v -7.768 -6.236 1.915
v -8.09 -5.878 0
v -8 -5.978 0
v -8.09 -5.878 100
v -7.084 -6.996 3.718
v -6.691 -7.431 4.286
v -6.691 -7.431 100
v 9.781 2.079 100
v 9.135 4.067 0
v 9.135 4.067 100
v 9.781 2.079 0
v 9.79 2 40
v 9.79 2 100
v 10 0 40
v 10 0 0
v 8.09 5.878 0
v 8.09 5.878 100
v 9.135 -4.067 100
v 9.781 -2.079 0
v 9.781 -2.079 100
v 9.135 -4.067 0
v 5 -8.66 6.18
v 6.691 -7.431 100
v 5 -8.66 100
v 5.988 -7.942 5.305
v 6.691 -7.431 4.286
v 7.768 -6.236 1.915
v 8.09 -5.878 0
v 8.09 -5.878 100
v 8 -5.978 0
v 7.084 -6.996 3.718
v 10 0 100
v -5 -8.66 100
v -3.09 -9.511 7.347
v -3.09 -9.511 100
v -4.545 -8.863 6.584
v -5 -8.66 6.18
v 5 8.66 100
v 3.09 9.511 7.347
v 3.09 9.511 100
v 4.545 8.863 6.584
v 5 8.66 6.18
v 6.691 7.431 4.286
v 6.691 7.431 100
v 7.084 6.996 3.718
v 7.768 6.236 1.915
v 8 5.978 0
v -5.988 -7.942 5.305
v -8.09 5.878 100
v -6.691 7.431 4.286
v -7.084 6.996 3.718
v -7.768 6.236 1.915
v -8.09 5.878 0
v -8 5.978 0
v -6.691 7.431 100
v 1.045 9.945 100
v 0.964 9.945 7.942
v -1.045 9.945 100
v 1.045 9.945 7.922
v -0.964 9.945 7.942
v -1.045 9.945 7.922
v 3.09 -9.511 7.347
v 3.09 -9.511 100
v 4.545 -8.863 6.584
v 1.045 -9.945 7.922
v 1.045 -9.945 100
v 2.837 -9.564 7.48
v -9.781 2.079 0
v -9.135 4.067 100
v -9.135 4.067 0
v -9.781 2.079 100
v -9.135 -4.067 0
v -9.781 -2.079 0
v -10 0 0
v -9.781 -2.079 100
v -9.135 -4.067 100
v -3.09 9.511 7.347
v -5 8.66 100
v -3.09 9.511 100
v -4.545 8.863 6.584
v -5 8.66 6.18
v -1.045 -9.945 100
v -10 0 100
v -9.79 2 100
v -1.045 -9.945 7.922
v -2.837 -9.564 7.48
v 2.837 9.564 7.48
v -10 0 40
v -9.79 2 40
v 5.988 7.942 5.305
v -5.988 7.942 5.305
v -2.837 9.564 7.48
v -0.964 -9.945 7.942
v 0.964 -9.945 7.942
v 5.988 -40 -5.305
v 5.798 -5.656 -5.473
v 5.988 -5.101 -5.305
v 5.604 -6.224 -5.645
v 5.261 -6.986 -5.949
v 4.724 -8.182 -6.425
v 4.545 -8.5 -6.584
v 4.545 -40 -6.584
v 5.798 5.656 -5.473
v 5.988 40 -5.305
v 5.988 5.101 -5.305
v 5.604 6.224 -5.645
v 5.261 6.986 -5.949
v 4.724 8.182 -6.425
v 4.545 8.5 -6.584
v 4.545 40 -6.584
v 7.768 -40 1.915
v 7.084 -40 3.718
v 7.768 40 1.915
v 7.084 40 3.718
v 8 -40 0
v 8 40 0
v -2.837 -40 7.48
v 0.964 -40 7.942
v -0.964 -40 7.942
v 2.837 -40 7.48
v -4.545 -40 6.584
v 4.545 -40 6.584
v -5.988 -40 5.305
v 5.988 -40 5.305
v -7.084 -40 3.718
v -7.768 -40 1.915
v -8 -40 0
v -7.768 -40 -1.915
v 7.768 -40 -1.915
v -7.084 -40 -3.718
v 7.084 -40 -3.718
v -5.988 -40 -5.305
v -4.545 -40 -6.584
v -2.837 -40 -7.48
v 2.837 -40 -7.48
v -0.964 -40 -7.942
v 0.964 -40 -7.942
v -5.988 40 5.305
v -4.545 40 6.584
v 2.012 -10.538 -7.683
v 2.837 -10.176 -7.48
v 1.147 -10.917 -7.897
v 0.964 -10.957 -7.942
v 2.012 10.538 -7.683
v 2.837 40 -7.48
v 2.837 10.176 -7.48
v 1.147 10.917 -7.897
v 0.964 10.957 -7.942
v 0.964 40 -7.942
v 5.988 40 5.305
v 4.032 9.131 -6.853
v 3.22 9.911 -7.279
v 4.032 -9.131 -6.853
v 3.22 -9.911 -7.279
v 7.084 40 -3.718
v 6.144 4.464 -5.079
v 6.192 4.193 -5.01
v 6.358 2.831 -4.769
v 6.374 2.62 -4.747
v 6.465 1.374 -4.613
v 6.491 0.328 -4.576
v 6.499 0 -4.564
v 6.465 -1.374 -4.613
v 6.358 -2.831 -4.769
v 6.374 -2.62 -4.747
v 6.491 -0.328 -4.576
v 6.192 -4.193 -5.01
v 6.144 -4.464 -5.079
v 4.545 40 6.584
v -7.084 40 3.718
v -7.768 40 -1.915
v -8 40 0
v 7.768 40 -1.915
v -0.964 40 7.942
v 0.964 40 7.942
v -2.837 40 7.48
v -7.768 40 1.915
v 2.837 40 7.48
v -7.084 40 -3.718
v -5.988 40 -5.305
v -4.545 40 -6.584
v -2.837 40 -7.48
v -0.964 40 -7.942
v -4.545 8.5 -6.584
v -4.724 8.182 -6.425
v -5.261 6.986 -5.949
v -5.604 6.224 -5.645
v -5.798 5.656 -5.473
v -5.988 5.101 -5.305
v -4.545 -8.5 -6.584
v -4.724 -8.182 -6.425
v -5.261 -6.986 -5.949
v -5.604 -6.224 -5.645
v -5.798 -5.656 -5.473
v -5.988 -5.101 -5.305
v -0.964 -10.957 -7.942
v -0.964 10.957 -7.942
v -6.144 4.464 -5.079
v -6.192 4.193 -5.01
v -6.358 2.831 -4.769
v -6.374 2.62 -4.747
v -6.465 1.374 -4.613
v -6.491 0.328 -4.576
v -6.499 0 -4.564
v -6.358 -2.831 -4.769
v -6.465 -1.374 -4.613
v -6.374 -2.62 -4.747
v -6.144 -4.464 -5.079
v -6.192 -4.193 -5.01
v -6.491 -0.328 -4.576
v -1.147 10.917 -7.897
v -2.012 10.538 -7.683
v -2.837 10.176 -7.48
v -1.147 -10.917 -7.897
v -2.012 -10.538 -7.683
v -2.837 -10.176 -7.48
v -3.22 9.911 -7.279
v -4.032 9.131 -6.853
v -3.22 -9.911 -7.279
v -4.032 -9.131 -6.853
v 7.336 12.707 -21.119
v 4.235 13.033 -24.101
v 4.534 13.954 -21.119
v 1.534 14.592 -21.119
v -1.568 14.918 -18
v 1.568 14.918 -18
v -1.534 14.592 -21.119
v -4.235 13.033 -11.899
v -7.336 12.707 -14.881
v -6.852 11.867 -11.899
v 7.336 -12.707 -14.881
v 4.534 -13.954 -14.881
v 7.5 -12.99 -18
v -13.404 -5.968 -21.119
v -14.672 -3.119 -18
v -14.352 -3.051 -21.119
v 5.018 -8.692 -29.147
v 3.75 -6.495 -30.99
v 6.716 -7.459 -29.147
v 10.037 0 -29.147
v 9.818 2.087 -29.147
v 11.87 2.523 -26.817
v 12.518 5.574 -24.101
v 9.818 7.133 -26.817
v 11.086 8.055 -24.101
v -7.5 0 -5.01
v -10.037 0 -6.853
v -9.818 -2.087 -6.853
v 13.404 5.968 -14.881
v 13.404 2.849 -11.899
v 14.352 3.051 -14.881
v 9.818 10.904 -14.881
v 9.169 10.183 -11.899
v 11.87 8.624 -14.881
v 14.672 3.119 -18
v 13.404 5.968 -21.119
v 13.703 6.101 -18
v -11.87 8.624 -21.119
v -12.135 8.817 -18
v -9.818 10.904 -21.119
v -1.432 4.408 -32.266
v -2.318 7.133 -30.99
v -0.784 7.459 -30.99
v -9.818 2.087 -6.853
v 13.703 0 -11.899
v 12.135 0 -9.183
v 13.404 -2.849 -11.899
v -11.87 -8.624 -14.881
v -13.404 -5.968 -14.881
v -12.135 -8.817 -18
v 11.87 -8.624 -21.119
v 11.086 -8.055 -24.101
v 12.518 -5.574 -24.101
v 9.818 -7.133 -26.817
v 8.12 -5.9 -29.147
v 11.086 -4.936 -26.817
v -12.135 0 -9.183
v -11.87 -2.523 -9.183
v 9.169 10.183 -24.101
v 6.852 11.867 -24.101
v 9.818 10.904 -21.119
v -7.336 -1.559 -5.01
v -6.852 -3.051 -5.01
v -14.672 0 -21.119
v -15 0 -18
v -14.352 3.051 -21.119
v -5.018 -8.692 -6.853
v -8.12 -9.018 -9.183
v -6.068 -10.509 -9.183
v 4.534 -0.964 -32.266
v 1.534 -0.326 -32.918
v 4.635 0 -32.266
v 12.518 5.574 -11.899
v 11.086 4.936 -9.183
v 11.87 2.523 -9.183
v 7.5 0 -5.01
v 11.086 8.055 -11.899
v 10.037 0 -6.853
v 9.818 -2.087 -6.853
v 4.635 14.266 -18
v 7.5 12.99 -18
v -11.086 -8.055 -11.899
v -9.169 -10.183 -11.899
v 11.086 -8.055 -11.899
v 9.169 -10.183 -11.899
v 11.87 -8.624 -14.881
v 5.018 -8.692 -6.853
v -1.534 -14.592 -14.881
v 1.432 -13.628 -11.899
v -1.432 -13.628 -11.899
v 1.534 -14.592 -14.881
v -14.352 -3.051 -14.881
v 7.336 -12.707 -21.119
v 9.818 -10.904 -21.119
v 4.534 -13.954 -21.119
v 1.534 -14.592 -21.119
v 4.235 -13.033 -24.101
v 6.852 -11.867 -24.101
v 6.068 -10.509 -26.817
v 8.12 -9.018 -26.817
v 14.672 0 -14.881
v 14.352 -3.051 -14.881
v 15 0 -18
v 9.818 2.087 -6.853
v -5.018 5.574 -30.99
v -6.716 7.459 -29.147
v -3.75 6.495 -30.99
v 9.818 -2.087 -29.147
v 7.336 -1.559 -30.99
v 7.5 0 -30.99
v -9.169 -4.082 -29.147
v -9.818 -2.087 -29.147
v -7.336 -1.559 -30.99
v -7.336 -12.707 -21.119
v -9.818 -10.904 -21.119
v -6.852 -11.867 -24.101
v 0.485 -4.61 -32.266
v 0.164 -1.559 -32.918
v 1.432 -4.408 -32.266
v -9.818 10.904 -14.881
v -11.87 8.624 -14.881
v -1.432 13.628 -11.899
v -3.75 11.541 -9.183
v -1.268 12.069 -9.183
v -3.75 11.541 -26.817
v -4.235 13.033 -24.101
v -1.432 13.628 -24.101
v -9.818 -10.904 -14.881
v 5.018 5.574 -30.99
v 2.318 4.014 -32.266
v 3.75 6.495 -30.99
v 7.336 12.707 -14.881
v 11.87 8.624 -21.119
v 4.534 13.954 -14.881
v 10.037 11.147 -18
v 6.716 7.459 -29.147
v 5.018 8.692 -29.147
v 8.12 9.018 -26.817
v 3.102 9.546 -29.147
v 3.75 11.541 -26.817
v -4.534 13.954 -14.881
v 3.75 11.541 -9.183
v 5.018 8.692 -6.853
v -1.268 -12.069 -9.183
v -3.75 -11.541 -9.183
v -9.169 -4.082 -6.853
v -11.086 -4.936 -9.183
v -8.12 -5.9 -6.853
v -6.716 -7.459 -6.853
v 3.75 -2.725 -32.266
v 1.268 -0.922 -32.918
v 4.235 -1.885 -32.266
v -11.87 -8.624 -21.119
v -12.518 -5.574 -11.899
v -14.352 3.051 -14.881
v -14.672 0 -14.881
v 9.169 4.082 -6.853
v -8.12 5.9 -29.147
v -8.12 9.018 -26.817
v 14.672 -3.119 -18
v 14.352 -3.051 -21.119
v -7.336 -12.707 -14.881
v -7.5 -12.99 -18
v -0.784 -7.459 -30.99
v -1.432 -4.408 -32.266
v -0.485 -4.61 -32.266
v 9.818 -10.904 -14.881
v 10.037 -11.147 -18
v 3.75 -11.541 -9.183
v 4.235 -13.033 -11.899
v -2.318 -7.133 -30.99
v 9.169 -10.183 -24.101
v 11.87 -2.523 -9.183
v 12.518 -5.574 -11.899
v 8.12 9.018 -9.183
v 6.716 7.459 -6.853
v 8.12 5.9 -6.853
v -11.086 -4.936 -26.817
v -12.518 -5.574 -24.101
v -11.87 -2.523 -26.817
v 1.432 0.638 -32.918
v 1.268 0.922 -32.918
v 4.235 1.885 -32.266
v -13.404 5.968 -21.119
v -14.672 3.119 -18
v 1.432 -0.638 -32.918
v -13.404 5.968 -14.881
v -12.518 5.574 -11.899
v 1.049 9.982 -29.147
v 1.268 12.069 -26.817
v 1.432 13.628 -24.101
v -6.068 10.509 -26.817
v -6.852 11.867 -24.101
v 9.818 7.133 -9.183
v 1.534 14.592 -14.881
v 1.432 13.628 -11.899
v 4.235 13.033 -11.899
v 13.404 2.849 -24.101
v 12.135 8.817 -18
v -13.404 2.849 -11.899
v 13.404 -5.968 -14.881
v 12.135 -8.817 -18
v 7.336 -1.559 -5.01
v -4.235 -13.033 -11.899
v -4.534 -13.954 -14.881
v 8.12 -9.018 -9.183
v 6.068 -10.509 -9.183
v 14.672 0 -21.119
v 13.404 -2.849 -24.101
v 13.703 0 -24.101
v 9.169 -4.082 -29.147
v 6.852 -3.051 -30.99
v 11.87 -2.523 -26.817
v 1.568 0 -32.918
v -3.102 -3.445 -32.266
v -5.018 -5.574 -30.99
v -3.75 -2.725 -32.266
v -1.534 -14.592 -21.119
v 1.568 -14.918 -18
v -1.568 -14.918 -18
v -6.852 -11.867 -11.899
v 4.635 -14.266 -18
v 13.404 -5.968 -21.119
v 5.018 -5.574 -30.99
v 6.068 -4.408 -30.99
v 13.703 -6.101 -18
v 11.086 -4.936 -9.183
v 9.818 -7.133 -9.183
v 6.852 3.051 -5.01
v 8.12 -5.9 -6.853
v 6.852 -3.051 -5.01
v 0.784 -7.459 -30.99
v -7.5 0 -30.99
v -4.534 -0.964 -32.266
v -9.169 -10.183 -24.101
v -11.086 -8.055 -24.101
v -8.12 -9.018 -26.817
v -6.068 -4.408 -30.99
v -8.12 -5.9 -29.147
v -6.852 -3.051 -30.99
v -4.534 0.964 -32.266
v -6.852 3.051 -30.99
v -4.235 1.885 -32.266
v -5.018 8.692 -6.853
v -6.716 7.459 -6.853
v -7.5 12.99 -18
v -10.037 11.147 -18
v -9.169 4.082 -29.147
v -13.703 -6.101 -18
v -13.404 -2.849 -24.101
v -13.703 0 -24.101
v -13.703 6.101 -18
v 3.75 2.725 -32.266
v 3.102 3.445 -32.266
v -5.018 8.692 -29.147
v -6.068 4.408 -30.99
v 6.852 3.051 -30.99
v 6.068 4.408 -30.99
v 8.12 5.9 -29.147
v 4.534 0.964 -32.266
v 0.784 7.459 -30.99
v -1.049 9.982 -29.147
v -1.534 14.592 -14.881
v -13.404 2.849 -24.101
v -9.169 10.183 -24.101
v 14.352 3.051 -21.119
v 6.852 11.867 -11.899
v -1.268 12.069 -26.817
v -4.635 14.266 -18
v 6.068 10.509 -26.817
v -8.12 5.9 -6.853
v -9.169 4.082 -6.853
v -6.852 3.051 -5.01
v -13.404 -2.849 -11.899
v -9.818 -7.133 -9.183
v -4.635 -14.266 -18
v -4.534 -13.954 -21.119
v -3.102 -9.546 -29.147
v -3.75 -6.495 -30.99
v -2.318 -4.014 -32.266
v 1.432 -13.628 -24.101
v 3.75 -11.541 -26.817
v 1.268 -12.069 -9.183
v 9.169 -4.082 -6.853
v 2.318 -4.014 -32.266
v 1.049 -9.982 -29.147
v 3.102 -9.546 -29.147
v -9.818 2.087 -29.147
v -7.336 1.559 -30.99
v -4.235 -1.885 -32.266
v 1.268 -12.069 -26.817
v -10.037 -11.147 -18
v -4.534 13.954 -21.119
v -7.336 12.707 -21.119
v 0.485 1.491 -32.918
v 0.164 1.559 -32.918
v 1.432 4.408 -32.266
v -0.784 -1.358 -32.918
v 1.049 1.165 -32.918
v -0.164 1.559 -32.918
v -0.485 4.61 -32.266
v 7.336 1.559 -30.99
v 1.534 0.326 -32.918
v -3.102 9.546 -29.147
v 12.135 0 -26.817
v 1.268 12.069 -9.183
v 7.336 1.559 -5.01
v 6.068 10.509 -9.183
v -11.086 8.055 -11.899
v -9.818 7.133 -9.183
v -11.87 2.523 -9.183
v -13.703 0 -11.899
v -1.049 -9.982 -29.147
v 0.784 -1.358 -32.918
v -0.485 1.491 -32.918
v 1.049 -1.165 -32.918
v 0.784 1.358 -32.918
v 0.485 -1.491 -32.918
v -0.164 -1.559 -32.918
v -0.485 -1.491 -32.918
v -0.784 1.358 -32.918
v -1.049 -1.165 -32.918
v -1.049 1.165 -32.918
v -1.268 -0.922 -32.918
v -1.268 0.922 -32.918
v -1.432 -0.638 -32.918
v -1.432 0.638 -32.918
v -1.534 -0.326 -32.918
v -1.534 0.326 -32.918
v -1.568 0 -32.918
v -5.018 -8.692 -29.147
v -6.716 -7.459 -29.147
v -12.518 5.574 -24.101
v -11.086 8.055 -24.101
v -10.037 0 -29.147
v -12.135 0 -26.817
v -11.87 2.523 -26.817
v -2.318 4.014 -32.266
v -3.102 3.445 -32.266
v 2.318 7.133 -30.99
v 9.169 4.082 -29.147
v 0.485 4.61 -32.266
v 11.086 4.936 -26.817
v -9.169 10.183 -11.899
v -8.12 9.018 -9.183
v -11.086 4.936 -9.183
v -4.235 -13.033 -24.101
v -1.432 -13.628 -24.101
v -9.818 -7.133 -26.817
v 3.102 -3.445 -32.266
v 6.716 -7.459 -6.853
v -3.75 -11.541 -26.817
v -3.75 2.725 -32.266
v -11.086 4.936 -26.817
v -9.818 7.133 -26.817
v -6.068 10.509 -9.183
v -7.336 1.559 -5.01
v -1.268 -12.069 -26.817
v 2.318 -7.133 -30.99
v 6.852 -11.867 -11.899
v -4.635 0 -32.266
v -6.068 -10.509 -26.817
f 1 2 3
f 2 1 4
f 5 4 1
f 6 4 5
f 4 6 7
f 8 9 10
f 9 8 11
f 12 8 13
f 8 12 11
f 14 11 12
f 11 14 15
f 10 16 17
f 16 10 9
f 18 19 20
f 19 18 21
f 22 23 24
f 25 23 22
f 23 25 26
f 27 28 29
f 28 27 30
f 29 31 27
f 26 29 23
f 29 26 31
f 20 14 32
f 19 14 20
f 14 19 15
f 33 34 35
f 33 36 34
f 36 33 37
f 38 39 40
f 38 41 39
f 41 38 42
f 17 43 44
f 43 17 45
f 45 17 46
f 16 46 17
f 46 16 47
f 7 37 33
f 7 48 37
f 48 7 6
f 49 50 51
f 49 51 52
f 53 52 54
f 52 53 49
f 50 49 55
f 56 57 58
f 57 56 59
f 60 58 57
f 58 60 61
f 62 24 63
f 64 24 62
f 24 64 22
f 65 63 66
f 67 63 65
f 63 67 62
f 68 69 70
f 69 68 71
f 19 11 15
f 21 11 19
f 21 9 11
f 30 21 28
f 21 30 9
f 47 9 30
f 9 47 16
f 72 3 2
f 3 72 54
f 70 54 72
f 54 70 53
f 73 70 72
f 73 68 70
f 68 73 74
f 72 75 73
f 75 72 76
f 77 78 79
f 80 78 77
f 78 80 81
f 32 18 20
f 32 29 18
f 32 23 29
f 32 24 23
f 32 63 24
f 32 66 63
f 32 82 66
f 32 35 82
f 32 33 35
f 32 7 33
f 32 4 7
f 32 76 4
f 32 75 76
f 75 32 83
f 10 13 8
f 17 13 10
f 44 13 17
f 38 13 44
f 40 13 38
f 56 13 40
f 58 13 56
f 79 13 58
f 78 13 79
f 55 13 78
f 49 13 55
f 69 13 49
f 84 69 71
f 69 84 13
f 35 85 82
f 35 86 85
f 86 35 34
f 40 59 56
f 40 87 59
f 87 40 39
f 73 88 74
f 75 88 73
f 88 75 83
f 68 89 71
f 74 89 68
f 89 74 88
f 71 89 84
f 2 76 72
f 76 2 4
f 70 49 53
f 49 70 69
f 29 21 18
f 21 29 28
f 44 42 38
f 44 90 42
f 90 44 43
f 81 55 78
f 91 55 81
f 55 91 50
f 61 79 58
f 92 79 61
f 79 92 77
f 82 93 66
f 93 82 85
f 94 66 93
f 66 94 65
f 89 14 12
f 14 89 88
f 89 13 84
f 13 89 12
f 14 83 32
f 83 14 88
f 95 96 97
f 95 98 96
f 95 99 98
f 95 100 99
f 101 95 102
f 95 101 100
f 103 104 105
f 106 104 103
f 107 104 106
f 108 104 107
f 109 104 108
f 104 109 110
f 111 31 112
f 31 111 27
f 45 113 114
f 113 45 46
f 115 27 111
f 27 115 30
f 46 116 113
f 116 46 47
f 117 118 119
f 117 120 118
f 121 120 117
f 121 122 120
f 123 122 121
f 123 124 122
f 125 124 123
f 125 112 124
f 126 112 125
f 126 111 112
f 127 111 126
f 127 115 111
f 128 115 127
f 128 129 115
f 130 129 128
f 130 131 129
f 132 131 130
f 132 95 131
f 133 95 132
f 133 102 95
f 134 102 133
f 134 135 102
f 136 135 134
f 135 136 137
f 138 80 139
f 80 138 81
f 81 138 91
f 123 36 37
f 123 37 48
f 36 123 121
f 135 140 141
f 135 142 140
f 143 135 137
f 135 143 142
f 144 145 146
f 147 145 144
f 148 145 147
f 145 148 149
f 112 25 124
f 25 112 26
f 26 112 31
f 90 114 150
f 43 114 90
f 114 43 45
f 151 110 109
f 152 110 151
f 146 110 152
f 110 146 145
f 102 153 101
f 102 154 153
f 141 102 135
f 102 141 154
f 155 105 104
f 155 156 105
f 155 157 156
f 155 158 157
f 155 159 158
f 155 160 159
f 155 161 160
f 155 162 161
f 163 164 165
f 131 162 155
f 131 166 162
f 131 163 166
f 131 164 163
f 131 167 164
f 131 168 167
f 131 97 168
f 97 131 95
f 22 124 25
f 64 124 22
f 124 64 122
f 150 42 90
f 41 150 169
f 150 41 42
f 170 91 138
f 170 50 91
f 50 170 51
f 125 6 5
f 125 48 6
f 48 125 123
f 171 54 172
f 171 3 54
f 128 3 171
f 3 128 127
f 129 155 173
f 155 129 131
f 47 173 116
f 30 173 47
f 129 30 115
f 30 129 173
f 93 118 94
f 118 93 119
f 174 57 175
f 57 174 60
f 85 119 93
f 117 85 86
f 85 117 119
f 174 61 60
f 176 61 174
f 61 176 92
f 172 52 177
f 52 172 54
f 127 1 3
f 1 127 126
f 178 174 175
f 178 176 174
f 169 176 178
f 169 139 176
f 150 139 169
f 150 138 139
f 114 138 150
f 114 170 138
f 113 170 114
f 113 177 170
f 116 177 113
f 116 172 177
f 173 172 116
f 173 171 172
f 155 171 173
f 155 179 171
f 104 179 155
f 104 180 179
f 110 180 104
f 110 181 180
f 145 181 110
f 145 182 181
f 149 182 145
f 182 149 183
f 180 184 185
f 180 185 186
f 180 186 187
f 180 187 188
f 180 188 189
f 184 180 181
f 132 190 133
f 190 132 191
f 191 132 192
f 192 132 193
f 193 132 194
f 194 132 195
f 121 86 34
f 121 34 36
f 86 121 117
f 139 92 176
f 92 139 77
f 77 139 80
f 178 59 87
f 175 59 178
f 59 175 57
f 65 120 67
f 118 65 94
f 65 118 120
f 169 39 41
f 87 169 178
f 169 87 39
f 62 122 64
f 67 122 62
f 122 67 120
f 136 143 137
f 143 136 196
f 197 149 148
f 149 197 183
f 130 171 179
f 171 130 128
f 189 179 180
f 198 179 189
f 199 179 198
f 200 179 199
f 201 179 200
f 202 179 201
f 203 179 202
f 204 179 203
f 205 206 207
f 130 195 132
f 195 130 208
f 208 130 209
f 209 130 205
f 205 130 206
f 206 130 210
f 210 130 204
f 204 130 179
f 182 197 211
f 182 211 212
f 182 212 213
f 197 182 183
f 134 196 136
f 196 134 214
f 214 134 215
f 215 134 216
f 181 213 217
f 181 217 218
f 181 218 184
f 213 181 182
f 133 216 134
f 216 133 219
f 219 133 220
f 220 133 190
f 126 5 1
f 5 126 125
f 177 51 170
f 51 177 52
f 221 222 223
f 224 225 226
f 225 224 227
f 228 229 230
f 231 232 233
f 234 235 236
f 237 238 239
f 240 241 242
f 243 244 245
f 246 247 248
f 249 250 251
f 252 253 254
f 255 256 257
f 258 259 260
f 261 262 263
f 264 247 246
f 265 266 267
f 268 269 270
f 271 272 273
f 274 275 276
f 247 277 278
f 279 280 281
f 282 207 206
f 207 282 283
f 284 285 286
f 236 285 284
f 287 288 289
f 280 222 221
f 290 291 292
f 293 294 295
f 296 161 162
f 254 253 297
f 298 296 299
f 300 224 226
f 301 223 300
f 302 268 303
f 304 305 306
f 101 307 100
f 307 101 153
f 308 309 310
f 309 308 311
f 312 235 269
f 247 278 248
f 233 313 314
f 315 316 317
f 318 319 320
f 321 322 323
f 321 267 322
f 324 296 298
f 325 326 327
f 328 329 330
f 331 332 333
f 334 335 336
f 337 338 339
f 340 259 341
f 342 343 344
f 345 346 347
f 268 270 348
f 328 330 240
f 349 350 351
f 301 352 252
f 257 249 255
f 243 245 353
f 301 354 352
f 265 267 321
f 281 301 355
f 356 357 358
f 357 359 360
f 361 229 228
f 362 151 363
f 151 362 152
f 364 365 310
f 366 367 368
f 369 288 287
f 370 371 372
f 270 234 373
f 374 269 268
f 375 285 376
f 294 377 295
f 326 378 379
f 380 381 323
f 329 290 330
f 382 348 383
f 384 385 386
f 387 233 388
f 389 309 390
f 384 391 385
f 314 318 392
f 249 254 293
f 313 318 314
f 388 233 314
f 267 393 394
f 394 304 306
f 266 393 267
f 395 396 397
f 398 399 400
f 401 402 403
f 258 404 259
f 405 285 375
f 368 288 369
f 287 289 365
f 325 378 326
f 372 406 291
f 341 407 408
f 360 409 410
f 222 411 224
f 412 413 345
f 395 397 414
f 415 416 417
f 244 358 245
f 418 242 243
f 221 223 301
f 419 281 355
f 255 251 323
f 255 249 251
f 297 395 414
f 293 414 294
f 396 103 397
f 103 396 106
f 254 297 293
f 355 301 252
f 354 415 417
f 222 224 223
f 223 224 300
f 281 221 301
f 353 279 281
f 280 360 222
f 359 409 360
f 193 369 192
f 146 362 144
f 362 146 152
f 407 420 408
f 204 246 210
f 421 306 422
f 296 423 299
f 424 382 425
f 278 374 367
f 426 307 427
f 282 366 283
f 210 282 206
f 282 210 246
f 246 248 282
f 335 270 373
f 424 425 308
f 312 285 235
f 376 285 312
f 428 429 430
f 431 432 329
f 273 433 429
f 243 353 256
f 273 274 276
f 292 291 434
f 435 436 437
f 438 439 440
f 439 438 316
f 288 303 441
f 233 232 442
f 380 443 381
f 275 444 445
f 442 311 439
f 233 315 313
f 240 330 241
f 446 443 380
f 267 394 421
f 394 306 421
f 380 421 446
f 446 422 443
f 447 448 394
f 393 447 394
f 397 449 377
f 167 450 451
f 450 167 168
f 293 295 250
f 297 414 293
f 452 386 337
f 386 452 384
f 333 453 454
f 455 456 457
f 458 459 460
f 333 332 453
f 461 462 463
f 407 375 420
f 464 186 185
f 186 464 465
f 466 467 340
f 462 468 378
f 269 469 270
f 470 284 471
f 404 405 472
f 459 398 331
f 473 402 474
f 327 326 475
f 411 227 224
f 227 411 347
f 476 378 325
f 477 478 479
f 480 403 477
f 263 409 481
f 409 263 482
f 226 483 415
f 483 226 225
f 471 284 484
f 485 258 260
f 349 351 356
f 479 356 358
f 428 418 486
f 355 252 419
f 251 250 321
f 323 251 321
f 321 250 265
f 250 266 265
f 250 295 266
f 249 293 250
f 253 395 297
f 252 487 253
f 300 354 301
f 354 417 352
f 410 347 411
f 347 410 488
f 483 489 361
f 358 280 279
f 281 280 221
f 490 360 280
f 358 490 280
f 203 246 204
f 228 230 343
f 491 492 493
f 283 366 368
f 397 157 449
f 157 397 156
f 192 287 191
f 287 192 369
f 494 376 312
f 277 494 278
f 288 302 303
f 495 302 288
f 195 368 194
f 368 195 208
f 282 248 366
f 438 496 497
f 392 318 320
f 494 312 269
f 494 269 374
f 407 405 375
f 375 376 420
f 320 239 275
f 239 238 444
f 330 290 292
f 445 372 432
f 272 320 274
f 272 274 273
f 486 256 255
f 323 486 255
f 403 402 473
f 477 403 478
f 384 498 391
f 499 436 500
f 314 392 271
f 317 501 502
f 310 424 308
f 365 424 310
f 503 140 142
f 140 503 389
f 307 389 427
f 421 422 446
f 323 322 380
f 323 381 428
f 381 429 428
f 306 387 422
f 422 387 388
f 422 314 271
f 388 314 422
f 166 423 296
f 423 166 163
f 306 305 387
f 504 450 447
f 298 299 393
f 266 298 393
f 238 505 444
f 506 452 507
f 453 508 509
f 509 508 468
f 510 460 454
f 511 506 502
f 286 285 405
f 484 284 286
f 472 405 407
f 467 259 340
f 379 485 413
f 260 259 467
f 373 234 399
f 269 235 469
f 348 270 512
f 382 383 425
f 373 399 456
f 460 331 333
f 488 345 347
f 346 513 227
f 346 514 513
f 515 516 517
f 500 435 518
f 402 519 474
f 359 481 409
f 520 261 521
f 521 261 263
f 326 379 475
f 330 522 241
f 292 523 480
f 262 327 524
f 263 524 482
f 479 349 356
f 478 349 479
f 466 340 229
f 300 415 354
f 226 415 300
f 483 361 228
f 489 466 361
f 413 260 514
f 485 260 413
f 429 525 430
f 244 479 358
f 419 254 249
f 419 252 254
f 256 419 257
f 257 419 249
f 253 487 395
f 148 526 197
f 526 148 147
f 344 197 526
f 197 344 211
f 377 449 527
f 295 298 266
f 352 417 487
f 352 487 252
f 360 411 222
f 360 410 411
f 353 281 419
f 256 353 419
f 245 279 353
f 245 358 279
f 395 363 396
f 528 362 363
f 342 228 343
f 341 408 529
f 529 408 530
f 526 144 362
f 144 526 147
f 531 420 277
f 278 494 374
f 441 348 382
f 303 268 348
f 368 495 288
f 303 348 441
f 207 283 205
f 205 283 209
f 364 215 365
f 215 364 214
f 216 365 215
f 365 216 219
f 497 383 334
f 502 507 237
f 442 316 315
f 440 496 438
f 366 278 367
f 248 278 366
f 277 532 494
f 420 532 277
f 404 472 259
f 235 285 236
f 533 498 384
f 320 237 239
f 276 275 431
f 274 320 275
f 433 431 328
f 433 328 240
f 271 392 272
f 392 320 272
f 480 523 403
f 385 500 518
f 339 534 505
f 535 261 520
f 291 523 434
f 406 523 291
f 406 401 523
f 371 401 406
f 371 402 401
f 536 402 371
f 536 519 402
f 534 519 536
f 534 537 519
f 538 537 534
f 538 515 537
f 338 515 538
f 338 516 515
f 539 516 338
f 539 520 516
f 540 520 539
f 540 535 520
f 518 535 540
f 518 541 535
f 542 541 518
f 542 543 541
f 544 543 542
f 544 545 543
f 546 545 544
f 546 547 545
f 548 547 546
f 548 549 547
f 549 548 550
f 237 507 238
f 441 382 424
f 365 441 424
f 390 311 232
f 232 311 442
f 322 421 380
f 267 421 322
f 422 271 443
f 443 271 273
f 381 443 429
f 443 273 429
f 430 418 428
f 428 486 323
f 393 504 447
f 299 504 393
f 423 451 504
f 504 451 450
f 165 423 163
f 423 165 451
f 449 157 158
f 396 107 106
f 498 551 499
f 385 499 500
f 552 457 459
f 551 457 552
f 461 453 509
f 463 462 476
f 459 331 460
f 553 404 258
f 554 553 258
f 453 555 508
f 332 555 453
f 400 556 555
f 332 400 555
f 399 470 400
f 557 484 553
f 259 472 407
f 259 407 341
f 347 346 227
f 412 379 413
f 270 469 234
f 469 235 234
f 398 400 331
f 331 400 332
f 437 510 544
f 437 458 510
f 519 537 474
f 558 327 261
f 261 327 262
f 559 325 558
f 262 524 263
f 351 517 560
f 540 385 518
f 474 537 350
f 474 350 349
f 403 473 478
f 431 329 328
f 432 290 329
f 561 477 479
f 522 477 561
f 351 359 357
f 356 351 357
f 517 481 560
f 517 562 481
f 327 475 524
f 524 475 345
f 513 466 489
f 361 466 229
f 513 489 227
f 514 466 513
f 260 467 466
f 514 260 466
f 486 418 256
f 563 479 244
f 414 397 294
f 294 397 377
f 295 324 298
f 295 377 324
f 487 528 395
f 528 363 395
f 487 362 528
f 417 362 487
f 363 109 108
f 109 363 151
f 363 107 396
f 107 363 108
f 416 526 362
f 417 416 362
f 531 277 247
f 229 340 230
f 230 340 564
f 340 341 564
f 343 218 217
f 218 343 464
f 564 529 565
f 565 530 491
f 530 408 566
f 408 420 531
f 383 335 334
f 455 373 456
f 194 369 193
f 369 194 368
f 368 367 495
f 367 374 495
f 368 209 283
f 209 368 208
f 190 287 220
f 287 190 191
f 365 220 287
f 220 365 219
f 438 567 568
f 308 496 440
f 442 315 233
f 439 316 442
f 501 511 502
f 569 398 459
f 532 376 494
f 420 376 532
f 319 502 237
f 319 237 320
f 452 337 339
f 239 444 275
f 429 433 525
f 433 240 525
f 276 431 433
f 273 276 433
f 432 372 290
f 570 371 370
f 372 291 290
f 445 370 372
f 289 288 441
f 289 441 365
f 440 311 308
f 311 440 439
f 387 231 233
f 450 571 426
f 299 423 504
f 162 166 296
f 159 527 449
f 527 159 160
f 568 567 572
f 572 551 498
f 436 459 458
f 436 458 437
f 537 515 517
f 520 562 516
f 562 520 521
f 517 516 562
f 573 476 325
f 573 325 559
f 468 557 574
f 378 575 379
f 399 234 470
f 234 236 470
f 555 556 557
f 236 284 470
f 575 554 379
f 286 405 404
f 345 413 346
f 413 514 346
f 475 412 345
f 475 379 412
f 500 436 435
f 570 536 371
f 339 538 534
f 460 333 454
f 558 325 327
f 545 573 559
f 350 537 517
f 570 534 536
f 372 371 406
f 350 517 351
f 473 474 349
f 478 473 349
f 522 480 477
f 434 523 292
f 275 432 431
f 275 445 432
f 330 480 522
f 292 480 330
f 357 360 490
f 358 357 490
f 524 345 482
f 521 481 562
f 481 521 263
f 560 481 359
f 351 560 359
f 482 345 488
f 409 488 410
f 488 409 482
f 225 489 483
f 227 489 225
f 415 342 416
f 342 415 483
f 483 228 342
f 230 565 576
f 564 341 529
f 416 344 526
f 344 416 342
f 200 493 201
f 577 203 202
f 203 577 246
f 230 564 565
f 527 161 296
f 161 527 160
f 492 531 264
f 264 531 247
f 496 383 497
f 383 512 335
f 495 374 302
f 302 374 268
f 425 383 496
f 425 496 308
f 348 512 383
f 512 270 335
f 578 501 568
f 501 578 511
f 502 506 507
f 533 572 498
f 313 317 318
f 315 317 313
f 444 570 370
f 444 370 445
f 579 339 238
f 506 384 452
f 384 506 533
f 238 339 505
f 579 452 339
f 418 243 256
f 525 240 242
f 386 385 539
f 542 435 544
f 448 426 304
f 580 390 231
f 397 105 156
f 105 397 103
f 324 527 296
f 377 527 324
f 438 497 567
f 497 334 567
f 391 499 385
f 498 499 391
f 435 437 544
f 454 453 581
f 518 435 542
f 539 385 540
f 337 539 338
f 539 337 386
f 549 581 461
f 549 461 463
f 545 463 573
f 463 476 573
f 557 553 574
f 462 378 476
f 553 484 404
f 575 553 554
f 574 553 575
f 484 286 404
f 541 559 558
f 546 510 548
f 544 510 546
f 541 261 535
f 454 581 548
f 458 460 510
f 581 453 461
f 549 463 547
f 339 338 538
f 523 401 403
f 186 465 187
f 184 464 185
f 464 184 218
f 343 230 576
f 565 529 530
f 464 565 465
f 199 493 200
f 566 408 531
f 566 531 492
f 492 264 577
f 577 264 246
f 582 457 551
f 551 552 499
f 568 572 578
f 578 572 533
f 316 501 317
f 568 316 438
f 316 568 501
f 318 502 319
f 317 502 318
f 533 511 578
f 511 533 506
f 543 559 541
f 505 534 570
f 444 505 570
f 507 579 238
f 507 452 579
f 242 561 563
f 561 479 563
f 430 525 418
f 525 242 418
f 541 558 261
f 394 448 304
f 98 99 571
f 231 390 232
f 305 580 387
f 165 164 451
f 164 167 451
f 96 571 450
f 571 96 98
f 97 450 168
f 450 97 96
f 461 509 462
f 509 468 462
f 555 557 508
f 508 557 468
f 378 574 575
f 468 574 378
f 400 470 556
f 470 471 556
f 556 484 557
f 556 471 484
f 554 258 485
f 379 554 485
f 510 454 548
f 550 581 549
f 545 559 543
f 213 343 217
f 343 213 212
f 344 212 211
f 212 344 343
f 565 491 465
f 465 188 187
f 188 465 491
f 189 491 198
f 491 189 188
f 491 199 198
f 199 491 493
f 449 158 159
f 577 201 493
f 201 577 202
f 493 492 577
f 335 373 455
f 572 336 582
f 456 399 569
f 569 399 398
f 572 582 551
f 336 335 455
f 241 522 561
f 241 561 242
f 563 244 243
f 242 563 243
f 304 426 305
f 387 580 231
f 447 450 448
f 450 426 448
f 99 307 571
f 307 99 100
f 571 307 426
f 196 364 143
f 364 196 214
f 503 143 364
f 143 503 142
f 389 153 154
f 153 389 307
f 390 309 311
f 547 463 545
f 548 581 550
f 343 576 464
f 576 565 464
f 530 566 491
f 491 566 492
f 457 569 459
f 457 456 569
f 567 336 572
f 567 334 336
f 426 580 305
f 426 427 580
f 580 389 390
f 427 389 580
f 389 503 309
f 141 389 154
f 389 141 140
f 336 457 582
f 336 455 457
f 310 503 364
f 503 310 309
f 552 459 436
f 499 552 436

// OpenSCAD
//arm
translate([0,40,0])rotate([90,0,0]) cylinder(80,8,8);
//head
translate([0,0,-18])sphere(15);
difference()
{
//tall clyinder 
 cylinder(100,10,10);
translate([-15,0,40]) cube([30,2,60]);
}
